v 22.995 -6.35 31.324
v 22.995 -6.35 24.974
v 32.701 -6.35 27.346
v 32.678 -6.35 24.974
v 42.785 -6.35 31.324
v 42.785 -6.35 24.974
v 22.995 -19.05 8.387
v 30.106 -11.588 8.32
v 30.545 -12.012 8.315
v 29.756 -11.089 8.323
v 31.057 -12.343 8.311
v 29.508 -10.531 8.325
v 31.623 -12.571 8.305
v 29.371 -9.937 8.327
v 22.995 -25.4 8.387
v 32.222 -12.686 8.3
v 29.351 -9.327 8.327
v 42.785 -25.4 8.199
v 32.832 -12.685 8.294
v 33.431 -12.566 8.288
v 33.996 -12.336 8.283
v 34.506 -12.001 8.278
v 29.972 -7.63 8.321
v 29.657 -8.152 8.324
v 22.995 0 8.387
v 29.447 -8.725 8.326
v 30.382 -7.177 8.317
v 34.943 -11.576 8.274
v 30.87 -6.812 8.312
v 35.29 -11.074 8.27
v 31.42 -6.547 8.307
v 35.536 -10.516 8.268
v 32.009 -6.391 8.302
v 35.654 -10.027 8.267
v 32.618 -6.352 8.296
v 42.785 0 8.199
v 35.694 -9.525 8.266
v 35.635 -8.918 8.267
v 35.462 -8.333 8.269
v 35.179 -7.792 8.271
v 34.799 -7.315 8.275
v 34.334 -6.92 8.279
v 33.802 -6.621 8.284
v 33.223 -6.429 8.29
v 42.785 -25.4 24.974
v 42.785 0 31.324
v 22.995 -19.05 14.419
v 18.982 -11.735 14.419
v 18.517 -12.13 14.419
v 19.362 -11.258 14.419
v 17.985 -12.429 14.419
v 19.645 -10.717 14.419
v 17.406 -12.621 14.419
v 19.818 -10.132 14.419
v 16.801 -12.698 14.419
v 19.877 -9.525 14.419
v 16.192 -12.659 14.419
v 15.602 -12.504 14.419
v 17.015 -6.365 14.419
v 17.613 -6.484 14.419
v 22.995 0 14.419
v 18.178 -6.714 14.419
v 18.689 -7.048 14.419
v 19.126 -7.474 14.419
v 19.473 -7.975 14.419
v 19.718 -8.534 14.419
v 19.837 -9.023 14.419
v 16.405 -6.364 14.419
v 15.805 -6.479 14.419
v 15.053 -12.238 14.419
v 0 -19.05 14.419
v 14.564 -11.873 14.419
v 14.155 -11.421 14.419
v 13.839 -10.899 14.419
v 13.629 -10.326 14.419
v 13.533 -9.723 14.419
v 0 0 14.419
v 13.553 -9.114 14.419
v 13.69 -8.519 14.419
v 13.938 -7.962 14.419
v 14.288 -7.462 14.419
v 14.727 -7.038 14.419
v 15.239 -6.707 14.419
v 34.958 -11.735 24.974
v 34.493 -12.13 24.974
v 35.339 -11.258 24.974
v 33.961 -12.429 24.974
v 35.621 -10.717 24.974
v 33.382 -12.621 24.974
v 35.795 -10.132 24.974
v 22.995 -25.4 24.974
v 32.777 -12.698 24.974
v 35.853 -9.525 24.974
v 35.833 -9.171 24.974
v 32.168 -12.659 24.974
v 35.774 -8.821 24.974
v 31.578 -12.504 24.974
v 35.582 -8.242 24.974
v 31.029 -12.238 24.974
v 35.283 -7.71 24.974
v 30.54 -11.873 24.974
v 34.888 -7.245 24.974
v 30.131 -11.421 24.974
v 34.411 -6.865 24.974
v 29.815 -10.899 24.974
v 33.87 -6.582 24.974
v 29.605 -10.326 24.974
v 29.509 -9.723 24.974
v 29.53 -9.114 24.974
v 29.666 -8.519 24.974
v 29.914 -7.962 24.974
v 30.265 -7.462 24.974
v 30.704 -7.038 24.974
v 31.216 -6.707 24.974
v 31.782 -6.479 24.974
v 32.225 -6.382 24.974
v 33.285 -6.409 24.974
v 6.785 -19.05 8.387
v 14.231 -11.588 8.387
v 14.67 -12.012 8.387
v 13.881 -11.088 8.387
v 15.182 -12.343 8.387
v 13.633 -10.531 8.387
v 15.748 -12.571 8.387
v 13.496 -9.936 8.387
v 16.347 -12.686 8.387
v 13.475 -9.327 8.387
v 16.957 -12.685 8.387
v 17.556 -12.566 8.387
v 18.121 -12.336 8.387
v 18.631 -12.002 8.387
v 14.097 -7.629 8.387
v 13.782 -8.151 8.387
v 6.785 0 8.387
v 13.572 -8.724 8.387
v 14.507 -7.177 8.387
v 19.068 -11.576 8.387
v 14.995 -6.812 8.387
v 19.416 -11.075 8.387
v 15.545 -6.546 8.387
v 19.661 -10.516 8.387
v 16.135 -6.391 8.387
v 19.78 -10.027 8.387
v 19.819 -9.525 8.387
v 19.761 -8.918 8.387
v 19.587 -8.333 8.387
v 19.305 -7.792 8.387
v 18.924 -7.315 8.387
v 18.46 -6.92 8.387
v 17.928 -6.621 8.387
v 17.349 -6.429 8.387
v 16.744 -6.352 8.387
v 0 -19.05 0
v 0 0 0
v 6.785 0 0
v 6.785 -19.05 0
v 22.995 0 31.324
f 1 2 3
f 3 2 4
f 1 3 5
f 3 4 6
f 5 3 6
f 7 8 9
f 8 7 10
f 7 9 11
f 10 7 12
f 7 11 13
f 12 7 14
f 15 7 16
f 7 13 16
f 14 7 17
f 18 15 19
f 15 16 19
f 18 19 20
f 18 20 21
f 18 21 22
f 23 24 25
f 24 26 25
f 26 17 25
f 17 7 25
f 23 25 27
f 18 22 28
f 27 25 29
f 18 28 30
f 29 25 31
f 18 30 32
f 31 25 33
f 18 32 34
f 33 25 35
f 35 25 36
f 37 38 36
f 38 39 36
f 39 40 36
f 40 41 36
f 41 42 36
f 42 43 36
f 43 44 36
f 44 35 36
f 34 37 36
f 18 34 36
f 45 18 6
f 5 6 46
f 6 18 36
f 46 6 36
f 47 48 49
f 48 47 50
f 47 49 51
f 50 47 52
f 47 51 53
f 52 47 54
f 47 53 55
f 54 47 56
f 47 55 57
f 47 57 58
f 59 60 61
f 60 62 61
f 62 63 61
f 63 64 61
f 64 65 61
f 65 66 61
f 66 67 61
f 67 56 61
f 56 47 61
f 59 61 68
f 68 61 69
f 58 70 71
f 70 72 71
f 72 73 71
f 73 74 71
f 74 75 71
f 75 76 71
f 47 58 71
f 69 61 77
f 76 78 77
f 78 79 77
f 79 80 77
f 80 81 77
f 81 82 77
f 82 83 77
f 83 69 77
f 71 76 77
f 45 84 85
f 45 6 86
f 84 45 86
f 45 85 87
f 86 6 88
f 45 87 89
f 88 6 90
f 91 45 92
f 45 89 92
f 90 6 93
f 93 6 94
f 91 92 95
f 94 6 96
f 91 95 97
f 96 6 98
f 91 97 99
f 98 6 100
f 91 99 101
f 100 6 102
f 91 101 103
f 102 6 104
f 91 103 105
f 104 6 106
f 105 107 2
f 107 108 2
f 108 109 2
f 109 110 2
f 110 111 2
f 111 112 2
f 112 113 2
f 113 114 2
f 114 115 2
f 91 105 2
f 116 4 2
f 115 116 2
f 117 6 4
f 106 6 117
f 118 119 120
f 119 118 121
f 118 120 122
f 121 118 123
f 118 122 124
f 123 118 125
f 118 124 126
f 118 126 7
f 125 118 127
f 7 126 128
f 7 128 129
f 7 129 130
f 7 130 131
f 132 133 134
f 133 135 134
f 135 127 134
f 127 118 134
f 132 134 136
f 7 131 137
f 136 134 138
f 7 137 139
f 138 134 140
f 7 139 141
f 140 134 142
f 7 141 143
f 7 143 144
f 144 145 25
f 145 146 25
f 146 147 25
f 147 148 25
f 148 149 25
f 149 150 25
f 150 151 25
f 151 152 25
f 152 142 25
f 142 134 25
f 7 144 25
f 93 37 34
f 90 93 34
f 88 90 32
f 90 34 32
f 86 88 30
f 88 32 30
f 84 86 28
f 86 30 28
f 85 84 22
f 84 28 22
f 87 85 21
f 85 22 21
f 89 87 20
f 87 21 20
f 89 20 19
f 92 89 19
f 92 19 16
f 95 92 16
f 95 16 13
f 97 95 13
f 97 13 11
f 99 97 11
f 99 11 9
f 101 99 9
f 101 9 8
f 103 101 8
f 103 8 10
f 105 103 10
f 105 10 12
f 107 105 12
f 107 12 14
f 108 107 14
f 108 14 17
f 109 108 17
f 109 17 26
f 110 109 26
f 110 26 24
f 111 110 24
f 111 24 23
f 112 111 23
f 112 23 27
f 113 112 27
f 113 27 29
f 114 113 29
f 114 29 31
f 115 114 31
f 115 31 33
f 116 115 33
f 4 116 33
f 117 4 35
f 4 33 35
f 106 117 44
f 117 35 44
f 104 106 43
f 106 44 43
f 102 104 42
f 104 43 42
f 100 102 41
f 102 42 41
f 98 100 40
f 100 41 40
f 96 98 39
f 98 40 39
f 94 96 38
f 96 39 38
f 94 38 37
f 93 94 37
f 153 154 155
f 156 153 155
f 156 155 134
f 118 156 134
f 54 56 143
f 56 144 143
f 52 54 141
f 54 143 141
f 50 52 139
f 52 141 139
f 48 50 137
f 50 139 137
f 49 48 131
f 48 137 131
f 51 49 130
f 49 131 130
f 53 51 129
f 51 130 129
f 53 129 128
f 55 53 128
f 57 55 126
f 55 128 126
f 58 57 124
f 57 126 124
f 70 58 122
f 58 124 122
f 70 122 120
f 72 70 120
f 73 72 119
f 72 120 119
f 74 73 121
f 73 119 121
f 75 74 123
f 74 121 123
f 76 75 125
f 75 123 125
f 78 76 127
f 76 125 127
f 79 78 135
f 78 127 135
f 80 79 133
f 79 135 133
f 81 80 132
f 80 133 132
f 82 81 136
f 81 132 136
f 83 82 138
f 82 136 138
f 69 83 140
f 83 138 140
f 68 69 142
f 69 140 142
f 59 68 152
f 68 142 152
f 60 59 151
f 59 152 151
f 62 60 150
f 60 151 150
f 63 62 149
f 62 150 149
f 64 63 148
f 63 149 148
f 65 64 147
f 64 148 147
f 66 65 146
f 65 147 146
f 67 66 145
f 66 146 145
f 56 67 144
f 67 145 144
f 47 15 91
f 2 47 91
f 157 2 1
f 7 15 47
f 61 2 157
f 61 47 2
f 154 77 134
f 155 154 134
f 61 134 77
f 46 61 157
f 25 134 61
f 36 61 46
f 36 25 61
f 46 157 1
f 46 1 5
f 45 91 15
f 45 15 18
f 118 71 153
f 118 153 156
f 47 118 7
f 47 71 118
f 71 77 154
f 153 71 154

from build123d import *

# Parameters (mm, degrees)
F1_DEPTH = 19.05
F2_DEPTH = 25.4
F3_W     = 19.790456
F3_H     = 6.35
F4_DEPTH = 6.35
F5_R     = 3.175
F6_DEPTH = 19.05


with BuildPart() as f1:
    # F0 (on Front) → F1 (new body)
    with BuildSketch(Plane.XZ):
        Polygon((0, 14.418764), (0, 0), (6.7853, 0), (6.7853, 8.387386), (22.99463, 8.387386), (22.99463, 14.418764), align=None)
    extrude(amount=F1_DEPTH)

    # F0 (on Front) → F2 (join)
    with BuildSketch(Plane.XZ):
        Polygon((22.99463, 24.973674), (22.99463, 14.418764), (22.99463, 8.387386), (42.785086, 8.198905), (42.785086, 24.973674), align=None)
    extrude(amount=F2_DEPTH)

    # F3 (on face) → F4 (join)
    with BuildSketch(Plane.XY.offset(24.973674)):
        with Locations((32.889858, -3.175)):
            Rectangle(F3_W, F3_H)
    extrude(amount=F4_DEPTH)

    # F5 (on face) → F6 (cut, symmetric)
    with BuildSketch(Plane(origin=(0.081958, 0, 8.605602), x_dir=(0.999955, 0, -0.009523), z_dir=(-0.009523, 0, -0.999955))):
        with Locations((16.563711, 9.525)):
            Circle(F5_R)
        with Locations((32.438711, 9.525)):
            Circle(F5_R)
    extrude(amount=F6_DEPTH, both=True, mode=Mode.SUBTRACT)


solid = f1.part
